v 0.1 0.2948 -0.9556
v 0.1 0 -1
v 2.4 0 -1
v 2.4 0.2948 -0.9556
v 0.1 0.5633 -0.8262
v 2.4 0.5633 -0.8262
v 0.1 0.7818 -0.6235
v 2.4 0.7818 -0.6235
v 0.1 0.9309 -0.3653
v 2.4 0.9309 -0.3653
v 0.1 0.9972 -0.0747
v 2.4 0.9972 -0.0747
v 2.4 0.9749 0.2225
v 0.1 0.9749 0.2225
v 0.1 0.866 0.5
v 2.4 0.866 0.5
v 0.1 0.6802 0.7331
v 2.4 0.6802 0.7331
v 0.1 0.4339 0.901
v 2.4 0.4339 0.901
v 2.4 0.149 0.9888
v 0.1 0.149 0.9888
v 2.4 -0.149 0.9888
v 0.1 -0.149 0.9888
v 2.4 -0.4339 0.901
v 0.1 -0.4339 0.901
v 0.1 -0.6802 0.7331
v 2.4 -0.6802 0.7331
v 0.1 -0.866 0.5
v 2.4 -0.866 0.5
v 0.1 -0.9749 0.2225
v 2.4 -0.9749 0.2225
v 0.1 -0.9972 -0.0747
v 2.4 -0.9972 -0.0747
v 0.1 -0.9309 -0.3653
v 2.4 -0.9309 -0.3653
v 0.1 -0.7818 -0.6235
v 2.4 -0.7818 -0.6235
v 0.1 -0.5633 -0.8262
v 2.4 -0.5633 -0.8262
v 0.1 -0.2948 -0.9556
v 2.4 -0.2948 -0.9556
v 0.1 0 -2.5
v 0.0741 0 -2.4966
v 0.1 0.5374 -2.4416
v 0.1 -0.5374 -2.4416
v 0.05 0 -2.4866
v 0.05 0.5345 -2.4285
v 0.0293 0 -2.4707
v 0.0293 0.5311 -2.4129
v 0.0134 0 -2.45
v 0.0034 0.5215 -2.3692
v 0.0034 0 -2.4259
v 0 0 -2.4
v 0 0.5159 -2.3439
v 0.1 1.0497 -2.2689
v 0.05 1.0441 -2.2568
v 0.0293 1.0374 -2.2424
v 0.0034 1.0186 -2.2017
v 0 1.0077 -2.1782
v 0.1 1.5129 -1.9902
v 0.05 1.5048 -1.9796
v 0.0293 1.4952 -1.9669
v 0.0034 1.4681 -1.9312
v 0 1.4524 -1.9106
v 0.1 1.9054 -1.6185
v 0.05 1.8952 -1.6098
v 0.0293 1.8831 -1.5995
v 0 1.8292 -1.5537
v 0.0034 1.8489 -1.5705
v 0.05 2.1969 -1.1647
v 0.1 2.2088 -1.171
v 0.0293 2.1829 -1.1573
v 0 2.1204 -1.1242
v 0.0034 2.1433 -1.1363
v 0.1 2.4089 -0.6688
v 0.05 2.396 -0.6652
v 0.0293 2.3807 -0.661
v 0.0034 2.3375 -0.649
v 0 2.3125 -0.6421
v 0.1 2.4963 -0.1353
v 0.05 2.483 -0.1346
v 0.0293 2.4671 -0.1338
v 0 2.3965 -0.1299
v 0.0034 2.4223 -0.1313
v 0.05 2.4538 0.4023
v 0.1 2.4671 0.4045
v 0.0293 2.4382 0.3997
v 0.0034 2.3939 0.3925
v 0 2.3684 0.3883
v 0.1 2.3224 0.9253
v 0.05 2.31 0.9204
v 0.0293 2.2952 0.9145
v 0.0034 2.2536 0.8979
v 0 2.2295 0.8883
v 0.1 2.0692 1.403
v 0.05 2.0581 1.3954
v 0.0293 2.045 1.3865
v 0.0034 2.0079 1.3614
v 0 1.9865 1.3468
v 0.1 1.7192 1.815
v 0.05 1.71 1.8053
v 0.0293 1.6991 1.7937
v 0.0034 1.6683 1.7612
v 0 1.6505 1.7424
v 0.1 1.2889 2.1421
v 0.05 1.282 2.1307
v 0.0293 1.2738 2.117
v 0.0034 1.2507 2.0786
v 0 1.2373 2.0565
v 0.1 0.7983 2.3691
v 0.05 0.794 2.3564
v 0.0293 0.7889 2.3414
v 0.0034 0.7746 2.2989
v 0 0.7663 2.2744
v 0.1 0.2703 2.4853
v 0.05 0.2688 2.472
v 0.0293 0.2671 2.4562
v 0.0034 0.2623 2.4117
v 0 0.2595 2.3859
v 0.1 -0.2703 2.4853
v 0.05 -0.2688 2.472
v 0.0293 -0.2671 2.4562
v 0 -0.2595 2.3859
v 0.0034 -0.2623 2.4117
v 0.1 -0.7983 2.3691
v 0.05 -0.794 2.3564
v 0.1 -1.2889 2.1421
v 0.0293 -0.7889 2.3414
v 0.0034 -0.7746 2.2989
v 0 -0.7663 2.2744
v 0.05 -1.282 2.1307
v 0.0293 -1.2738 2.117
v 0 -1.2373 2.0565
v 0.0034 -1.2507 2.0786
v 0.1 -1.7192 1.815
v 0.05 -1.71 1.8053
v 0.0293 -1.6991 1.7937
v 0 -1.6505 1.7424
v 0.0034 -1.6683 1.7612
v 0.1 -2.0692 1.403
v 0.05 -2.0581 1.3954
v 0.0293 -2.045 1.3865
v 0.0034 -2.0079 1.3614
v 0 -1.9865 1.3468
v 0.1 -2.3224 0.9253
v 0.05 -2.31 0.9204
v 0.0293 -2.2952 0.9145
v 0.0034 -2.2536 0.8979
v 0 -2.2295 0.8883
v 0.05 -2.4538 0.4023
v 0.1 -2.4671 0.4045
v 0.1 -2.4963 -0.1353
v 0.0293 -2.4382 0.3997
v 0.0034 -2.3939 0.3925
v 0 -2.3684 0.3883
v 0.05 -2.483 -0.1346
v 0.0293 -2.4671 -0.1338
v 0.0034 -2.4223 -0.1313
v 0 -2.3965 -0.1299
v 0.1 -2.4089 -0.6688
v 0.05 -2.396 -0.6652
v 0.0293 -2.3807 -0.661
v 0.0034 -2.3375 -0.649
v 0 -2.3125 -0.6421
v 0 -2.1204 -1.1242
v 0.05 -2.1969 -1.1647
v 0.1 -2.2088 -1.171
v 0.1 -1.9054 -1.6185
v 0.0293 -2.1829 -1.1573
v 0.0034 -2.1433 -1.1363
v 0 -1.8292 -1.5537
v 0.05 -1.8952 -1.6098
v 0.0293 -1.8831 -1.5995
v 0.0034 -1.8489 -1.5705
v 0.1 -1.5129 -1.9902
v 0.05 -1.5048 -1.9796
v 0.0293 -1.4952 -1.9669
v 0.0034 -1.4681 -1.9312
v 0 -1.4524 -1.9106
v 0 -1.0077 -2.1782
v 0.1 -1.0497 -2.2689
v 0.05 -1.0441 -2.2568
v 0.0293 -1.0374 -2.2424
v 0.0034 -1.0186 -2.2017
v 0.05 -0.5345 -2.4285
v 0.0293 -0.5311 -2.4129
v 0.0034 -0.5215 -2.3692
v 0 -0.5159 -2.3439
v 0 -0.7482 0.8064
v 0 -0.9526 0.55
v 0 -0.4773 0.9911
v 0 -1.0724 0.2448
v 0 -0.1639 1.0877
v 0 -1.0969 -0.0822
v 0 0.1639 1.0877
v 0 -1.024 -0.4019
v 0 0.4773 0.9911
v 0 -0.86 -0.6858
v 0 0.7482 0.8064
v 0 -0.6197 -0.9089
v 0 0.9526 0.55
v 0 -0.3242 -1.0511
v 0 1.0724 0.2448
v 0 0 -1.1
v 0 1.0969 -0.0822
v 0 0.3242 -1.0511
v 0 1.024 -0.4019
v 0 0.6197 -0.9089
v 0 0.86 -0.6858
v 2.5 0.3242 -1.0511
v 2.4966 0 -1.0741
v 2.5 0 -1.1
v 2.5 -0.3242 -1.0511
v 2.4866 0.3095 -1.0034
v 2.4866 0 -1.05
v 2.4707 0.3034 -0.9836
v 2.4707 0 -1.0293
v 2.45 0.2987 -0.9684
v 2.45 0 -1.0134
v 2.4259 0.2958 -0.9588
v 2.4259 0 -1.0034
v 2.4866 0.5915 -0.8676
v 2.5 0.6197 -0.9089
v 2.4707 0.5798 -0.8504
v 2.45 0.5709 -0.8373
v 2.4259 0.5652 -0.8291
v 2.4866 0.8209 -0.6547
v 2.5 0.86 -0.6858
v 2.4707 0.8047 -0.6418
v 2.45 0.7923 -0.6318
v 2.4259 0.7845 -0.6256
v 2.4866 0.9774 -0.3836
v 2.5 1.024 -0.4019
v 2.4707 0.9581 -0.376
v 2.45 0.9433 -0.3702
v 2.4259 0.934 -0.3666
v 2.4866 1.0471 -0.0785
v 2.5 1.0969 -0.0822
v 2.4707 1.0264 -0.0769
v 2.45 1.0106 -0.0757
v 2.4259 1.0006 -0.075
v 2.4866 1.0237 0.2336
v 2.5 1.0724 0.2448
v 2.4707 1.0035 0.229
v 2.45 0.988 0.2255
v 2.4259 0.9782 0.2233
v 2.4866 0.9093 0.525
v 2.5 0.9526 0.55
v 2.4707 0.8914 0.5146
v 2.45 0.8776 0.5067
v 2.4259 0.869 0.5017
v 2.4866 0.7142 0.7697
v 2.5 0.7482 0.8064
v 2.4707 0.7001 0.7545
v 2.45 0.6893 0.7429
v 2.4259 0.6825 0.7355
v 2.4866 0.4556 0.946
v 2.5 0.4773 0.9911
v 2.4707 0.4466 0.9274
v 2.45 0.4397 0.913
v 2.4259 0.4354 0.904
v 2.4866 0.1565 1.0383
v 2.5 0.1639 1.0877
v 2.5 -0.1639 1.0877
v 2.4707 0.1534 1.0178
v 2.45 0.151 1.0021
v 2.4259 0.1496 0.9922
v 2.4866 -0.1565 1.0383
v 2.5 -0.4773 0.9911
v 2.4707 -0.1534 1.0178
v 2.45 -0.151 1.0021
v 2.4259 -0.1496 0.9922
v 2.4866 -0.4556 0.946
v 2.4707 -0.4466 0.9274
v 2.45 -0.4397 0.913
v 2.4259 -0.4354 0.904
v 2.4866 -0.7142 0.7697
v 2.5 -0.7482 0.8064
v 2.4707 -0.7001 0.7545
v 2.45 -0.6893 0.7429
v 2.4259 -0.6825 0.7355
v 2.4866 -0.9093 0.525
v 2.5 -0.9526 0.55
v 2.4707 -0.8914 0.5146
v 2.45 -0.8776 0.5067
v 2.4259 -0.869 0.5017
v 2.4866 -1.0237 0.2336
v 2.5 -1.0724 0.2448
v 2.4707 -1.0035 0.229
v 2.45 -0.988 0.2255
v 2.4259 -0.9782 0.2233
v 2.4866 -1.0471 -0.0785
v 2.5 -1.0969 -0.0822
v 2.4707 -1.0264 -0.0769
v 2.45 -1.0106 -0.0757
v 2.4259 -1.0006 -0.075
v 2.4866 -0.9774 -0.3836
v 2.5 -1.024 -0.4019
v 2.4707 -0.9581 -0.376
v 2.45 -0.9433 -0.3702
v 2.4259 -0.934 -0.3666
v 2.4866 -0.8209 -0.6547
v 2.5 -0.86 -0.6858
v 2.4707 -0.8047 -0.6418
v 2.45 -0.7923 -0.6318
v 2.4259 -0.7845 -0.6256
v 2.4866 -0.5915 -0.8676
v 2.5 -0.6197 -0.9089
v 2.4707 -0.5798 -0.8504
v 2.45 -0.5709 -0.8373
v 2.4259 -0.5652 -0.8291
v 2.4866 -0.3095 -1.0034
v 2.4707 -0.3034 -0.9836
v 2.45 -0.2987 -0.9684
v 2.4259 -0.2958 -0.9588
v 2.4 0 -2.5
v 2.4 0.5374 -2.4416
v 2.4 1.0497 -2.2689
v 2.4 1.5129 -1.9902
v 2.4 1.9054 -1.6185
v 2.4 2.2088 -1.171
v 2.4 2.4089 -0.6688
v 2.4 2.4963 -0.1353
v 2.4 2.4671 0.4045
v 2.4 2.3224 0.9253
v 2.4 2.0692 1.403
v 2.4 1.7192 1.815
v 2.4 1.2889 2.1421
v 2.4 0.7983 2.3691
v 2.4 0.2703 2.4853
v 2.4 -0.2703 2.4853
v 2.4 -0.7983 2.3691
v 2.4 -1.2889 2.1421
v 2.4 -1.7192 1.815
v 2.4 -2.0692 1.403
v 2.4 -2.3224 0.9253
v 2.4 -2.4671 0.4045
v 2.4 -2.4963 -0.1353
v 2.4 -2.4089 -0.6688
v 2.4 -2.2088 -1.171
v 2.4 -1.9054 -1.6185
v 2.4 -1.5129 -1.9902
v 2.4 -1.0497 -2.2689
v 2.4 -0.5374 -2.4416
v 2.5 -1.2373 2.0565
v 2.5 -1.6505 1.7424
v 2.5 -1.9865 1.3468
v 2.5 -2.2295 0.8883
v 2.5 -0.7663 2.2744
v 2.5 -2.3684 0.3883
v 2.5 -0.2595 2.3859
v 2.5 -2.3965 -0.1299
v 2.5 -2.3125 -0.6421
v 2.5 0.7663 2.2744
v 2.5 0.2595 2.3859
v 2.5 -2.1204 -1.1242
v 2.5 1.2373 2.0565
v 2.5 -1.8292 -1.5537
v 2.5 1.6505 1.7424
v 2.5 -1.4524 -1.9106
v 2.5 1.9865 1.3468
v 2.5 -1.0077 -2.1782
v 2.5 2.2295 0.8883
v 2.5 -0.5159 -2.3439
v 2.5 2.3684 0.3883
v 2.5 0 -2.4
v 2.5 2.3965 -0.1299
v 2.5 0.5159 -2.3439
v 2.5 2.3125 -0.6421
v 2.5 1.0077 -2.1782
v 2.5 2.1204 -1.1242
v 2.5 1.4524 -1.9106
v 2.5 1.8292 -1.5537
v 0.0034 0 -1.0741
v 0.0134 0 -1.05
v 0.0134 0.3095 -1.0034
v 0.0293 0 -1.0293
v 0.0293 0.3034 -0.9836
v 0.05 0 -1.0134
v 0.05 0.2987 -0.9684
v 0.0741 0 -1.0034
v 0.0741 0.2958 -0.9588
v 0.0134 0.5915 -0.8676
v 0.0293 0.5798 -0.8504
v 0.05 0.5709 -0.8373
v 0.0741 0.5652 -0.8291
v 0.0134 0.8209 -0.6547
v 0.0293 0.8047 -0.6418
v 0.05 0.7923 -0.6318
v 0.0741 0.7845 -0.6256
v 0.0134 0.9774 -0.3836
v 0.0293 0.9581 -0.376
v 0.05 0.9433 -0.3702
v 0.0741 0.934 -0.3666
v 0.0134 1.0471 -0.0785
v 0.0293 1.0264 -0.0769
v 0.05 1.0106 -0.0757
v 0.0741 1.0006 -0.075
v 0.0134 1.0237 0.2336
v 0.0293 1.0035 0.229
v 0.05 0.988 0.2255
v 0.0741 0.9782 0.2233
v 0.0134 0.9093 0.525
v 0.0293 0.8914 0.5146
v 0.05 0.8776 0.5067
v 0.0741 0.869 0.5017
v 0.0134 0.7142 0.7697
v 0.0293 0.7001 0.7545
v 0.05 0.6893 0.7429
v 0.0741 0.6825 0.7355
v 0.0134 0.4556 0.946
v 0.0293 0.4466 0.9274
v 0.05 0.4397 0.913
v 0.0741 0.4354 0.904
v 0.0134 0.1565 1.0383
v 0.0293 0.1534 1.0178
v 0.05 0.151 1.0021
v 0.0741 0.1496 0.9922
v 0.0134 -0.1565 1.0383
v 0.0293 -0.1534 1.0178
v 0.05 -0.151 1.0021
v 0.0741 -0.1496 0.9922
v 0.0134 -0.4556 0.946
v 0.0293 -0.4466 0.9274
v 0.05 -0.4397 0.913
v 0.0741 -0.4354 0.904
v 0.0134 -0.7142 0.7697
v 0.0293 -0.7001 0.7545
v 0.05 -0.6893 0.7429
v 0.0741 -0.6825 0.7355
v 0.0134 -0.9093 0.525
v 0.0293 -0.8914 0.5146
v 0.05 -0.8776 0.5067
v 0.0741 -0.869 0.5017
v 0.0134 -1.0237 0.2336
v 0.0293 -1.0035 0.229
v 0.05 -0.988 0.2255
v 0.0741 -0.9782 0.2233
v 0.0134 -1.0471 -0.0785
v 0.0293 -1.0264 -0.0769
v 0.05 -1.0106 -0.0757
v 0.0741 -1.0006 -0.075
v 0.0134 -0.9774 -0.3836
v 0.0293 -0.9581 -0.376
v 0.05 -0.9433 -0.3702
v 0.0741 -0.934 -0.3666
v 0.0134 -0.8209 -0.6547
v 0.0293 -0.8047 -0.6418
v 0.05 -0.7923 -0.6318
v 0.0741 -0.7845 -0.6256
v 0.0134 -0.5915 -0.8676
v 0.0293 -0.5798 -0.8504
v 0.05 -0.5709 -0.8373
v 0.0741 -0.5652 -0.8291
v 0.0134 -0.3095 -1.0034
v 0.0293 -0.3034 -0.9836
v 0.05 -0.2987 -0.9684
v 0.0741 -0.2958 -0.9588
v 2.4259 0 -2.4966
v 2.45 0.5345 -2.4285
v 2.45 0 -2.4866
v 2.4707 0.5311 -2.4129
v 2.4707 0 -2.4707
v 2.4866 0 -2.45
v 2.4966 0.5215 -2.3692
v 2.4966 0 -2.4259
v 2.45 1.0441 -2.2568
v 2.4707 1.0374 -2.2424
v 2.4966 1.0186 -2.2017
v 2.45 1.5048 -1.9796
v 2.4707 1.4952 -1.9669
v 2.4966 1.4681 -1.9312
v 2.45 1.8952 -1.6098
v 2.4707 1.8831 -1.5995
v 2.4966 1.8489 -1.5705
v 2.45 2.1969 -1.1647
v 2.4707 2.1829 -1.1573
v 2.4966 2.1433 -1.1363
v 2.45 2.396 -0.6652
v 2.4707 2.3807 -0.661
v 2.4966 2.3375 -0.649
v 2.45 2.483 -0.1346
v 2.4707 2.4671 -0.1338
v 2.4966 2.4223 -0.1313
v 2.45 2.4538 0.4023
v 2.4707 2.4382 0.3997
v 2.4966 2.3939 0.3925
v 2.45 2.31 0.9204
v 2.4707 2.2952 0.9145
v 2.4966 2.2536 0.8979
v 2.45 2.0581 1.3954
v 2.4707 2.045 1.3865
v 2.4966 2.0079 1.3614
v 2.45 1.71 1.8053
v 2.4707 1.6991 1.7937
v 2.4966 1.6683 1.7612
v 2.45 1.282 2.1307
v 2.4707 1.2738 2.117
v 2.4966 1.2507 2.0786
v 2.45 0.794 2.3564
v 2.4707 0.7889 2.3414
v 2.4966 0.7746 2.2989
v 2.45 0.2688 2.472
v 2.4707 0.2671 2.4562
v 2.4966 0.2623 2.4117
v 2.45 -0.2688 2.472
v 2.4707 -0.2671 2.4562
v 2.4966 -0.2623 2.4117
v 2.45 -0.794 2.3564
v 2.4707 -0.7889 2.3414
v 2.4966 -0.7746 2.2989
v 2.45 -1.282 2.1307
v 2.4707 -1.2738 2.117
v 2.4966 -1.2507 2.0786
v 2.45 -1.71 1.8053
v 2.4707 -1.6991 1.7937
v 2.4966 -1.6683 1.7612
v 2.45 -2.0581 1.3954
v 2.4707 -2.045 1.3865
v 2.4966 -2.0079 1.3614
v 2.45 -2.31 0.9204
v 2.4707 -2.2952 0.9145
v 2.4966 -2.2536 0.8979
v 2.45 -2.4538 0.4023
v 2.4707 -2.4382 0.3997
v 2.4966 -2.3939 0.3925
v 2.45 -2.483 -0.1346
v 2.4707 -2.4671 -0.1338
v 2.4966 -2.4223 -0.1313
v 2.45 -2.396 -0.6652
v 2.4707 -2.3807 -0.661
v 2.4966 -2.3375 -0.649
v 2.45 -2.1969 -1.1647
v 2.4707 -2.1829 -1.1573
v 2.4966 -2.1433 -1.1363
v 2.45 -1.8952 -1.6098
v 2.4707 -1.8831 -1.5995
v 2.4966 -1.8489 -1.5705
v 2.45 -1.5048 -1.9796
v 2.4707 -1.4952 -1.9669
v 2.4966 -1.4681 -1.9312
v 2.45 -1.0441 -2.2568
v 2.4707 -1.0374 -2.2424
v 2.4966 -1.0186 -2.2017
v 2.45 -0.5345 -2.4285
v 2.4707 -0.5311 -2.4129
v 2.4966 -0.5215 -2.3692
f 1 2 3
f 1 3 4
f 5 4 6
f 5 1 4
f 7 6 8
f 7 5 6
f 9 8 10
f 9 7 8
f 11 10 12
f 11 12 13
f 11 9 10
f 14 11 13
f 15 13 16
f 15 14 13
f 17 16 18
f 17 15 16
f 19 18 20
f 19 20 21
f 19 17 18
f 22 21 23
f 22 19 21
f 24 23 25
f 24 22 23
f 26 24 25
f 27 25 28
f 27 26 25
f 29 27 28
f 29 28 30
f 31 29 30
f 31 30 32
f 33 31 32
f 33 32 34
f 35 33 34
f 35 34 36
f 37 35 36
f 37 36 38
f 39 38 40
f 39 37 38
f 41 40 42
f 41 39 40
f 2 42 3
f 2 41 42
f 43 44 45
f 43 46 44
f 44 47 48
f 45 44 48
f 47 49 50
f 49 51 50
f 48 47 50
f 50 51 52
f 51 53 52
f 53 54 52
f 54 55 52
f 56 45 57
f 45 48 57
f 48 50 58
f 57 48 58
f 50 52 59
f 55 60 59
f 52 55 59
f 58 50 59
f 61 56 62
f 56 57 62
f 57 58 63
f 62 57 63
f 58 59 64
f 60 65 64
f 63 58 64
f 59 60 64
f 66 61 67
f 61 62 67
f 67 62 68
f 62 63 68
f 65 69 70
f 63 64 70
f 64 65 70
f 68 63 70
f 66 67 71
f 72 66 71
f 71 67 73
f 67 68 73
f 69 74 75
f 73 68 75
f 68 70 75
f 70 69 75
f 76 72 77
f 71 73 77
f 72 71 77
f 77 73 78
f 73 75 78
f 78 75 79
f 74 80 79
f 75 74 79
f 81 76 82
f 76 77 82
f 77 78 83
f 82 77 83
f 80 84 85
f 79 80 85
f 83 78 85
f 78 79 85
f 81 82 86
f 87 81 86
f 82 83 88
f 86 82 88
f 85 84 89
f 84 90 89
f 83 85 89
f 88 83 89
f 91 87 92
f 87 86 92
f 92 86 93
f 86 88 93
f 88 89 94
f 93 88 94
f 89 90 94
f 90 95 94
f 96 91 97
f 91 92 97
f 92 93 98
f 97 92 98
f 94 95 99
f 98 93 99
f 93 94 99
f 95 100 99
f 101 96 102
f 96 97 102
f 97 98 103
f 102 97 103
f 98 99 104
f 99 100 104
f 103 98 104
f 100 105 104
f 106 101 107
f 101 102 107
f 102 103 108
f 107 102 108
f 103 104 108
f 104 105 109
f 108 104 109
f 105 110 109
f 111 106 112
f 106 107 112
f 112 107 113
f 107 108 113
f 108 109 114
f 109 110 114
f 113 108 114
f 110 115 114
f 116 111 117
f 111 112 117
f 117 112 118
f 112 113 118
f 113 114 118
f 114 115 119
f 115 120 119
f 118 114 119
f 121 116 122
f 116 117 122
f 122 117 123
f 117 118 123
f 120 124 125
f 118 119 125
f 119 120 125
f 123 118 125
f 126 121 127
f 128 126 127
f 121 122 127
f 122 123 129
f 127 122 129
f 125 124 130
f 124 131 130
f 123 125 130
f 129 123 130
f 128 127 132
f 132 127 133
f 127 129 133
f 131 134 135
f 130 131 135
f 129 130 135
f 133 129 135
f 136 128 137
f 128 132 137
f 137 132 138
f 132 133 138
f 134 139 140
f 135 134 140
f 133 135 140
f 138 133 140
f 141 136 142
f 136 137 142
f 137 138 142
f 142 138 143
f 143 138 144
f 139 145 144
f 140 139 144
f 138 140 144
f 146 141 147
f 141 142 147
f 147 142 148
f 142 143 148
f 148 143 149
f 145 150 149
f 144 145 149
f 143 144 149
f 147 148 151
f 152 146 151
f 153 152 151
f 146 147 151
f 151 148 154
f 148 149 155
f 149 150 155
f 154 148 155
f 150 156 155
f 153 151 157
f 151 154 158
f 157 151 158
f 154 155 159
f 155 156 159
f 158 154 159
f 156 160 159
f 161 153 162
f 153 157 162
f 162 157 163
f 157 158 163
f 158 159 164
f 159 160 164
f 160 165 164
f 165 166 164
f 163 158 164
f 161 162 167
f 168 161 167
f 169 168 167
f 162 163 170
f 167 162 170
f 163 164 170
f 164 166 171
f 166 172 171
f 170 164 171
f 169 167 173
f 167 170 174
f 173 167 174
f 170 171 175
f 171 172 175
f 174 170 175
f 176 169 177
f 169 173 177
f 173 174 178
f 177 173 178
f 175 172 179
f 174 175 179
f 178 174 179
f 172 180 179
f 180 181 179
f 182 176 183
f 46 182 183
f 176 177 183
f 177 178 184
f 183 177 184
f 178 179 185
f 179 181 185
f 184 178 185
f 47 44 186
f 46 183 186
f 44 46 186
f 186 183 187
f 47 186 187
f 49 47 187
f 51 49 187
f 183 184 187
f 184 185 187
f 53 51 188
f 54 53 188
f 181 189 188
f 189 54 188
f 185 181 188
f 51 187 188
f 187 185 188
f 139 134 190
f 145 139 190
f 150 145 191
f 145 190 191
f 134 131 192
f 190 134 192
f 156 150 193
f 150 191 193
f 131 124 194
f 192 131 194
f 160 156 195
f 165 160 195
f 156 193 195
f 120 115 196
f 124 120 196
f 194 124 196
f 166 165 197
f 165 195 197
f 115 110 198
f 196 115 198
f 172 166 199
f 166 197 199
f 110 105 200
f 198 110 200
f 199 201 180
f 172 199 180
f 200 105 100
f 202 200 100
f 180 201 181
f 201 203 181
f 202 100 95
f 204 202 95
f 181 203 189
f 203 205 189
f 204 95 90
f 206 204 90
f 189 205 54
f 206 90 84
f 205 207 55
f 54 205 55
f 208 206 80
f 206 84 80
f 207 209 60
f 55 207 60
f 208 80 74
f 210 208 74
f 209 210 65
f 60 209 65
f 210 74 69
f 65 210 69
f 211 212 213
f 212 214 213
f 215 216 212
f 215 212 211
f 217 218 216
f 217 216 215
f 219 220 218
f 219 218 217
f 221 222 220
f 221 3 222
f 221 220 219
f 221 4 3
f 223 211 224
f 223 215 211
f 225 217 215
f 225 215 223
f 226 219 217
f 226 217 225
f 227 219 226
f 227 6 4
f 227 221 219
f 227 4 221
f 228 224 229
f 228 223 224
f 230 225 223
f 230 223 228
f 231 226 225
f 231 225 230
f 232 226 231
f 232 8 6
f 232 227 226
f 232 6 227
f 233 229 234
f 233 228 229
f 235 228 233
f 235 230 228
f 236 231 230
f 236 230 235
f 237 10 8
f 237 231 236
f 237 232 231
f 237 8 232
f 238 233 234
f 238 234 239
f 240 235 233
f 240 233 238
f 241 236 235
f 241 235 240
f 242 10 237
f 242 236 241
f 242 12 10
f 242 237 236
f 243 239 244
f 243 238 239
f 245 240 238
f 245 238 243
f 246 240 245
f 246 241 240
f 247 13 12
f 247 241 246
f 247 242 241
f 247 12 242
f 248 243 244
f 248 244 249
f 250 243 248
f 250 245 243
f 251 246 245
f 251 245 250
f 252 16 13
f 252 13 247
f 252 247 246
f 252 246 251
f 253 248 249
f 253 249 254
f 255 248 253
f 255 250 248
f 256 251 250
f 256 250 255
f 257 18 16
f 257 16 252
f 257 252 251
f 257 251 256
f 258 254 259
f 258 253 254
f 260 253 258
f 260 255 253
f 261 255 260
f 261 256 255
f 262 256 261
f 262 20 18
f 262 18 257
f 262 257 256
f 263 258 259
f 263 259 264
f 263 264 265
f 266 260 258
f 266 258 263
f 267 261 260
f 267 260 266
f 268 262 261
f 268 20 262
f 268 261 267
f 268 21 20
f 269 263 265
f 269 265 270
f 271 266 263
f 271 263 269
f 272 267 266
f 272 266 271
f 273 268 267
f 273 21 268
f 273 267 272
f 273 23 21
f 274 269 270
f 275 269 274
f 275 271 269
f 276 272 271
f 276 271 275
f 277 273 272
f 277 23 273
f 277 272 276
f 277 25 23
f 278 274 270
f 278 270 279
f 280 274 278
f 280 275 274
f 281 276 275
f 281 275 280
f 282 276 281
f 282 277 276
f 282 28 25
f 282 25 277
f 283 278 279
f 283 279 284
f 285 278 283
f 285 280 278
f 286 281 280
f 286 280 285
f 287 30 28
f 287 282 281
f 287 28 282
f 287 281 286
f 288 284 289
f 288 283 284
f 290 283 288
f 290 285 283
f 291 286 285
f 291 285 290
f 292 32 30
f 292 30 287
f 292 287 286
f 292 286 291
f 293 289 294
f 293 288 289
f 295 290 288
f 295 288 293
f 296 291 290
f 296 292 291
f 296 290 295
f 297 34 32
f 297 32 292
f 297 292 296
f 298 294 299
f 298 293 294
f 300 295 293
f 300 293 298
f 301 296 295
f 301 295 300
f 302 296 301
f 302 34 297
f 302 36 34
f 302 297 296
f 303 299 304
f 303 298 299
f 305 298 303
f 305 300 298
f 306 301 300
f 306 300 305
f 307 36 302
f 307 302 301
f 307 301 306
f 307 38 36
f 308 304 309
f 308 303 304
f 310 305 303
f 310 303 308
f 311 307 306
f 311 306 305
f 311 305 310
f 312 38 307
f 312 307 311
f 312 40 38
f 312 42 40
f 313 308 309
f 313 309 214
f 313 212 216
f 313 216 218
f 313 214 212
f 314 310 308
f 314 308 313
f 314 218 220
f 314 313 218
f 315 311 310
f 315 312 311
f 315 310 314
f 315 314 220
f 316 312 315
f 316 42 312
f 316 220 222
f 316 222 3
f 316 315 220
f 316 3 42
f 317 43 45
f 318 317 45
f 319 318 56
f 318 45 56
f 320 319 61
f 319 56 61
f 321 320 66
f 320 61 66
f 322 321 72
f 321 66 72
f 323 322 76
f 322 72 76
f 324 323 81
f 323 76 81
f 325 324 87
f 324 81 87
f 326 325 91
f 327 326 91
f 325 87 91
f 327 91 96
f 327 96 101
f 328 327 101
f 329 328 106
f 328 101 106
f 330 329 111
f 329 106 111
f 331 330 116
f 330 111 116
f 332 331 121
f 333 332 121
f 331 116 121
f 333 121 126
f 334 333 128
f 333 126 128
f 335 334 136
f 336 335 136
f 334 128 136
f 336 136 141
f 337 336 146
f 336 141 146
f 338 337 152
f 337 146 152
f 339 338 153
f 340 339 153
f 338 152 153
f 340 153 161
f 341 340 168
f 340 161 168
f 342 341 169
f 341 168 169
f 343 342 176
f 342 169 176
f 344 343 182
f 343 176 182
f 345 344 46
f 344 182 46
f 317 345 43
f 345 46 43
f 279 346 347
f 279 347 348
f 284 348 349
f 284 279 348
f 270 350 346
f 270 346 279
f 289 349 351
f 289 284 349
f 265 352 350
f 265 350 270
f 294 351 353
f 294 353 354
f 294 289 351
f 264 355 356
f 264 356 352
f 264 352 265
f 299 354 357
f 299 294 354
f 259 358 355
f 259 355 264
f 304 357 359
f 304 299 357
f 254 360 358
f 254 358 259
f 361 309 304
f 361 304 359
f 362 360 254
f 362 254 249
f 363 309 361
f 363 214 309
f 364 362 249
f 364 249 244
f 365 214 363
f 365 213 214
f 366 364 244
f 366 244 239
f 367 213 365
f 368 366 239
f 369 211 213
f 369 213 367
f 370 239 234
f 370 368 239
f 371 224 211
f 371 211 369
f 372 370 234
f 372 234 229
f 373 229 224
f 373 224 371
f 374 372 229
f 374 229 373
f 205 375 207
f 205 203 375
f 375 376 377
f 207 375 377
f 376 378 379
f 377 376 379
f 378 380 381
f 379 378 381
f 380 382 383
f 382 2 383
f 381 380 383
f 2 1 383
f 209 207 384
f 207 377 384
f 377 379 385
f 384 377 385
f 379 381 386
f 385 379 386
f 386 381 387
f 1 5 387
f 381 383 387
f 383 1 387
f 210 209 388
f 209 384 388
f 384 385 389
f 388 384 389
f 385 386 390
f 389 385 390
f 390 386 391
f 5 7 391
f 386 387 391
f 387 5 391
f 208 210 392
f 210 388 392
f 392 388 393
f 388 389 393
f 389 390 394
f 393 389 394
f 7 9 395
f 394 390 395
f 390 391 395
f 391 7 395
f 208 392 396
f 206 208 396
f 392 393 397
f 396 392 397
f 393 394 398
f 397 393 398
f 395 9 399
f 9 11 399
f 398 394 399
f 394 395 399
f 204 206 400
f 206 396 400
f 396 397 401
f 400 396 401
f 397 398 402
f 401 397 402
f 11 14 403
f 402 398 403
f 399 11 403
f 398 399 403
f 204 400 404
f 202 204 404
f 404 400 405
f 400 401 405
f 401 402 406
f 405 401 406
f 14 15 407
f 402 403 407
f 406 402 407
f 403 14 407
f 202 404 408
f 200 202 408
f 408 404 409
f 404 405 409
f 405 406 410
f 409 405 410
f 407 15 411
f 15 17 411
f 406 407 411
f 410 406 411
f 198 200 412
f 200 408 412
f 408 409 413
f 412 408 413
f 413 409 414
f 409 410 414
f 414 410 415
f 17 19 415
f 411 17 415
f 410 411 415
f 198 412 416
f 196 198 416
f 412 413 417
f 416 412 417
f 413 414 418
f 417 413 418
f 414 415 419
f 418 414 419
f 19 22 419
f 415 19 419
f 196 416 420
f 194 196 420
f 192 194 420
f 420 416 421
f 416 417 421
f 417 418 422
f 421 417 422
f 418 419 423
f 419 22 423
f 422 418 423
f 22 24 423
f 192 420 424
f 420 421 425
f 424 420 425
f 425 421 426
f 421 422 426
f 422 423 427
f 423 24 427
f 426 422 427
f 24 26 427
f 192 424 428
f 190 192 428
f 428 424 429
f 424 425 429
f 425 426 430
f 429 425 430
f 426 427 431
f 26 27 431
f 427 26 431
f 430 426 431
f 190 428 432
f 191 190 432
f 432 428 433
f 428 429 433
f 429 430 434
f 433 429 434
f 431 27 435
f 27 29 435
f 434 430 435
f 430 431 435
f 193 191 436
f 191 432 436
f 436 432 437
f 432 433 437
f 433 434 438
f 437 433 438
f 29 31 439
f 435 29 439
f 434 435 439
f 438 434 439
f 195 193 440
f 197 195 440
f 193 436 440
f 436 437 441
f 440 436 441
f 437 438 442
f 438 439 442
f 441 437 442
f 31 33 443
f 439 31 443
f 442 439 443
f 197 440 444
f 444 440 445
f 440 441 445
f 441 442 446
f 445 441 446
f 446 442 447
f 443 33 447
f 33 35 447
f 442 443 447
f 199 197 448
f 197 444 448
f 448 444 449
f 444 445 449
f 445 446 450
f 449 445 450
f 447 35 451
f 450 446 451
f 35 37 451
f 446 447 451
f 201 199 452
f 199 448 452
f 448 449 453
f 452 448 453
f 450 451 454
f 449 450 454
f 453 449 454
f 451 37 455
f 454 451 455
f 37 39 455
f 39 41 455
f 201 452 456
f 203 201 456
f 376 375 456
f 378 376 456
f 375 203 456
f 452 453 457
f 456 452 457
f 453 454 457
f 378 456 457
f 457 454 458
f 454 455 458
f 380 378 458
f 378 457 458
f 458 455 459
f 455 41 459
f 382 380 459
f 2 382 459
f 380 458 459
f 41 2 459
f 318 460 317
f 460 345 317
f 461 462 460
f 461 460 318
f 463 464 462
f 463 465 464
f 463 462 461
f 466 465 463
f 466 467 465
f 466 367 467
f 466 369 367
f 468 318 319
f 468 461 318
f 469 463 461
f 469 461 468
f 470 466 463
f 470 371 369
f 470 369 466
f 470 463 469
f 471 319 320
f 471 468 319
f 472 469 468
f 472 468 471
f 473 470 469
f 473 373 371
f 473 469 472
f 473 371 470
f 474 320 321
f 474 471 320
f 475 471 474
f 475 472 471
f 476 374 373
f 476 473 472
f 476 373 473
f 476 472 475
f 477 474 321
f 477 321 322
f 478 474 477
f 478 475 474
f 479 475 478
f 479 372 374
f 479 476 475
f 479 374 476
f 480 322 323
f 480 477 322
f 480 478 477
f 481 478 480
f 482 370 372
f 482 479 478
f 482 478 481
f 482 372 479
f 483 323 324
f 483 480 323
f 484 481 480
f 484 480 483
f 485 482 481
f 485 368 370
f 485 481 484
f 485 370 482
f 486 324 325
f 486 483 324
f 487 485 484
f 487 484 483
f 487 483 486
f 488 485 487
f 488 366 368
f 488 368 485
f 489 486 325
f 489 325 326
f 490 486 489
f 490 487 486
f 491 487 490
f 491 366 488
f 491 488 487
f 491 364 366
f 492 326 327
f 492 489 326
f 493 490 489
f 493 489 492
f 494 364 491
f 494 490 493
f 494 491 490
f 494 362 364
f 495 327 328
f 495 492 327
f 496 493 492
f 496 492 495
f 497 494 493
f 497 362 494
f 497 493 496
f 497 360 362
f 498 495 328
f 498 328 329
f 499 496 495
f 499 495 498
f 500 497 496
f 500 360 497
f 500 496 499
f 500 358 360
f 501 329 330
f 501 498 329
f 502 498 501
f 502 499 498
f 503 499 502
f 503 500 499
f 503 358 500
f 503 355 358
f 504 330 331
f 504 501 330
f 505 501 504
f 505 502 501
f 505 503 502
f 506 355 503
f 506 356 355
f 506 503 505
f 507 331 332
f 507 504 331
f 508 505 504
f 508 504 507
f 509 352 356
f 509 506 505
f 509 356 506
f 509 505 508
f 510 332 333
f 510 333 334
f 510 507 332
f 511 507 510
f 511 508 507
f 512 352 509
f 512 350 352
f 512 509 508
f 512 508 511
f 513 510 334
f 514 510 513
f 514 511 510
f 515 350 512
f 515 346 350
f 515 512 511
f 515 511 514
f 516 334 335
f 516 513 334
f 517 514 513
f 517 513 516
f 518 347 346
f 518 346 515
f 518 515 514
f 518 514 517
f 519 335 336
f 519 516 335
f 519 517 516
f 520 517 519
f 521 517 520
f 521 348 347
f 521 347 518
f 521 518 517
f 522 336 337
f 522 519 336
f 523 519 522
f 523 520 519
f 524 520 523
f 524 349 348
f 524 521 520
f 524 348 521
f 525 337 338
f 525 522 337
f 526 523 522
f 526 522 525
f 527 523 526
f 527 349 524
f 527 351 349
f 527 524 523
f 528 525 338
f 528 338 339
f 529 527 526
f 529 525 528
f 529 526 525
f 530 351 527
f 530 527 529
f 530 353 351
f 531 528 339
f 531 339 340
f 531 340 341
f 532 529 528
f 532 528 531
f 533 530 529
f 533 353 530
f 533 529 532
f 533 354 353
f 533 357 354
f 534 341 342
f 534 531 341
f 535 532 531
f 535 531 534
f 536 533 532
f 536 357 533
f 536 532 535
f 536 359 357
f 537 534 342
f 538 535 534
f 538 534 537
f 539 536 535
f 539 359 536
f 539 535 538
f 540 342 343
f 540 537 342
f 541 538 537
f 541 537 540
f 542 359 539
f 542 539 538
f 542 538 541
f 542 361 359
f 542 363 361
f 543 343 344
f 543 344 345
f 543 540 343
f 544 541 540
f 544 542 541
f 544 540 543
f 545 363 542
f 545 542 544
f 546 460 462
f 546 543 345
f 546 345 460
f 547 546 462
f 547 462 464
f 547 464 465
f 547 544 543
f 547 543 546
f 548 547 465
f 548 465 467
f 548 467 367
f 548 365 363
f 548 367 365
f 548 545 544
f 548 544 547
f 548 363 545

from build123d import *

# Parameters (mm, degrees)
SKETCH1_R           = 2.5
SKETCH1_R_2         = 1
BOSS_EXTRUDE1_DEPTH = 2.5
FILLET1_R           = 0.1
FILLET2_R           = 0.1
FILLET3_R           = 0.1
FILLET4_R           = 0.1


with BuildPart() as part:
    # Sketch1 → Boss-Extrude1 (new body)
    with BuildSketch(Plane(origin=(0, 0, 0), x_dir=(0, 0, -1), z_dir=(1, 0, 0))):
        Circle(SKETCH1_R)
        Circle(SKETCH1_R_2, mode=Mode.SUBTRACT)
    extrude(amount=BOSS_EXTRUDE1_DEPTH)

    # Fillet1
    fillet1_edges = [part.edges().sort_by_distance(p)[0] for p in [
        (2.5, 0, 2.5),
    ]]
    fillet(fillet1_edges, radius=FILLET1_R)

    # Fillet2
    fillet2_edges = [part.edges().sort_by_distance(p)[0] for p in [
        (2.5, 0, 1),
    ]]
    fillet(fillet2_edges, radius=FILLET2_R)

    # Fillet3
    fillet3_edges = [part.edges().sort_by_distance(p)[0] for p in [
        (0, 0, 2.5),
    ]]
    fillet(fillet3_edges, radius=FILLET3_R)

    # Fillet4
    fillet4_edges = [part.edges().sort_by_distance(p)[0] for p in [
        (0, 0, 1),
    ]]
    fillet(fillet4_edges, radius=FILLET4_R)


solid = part.part
